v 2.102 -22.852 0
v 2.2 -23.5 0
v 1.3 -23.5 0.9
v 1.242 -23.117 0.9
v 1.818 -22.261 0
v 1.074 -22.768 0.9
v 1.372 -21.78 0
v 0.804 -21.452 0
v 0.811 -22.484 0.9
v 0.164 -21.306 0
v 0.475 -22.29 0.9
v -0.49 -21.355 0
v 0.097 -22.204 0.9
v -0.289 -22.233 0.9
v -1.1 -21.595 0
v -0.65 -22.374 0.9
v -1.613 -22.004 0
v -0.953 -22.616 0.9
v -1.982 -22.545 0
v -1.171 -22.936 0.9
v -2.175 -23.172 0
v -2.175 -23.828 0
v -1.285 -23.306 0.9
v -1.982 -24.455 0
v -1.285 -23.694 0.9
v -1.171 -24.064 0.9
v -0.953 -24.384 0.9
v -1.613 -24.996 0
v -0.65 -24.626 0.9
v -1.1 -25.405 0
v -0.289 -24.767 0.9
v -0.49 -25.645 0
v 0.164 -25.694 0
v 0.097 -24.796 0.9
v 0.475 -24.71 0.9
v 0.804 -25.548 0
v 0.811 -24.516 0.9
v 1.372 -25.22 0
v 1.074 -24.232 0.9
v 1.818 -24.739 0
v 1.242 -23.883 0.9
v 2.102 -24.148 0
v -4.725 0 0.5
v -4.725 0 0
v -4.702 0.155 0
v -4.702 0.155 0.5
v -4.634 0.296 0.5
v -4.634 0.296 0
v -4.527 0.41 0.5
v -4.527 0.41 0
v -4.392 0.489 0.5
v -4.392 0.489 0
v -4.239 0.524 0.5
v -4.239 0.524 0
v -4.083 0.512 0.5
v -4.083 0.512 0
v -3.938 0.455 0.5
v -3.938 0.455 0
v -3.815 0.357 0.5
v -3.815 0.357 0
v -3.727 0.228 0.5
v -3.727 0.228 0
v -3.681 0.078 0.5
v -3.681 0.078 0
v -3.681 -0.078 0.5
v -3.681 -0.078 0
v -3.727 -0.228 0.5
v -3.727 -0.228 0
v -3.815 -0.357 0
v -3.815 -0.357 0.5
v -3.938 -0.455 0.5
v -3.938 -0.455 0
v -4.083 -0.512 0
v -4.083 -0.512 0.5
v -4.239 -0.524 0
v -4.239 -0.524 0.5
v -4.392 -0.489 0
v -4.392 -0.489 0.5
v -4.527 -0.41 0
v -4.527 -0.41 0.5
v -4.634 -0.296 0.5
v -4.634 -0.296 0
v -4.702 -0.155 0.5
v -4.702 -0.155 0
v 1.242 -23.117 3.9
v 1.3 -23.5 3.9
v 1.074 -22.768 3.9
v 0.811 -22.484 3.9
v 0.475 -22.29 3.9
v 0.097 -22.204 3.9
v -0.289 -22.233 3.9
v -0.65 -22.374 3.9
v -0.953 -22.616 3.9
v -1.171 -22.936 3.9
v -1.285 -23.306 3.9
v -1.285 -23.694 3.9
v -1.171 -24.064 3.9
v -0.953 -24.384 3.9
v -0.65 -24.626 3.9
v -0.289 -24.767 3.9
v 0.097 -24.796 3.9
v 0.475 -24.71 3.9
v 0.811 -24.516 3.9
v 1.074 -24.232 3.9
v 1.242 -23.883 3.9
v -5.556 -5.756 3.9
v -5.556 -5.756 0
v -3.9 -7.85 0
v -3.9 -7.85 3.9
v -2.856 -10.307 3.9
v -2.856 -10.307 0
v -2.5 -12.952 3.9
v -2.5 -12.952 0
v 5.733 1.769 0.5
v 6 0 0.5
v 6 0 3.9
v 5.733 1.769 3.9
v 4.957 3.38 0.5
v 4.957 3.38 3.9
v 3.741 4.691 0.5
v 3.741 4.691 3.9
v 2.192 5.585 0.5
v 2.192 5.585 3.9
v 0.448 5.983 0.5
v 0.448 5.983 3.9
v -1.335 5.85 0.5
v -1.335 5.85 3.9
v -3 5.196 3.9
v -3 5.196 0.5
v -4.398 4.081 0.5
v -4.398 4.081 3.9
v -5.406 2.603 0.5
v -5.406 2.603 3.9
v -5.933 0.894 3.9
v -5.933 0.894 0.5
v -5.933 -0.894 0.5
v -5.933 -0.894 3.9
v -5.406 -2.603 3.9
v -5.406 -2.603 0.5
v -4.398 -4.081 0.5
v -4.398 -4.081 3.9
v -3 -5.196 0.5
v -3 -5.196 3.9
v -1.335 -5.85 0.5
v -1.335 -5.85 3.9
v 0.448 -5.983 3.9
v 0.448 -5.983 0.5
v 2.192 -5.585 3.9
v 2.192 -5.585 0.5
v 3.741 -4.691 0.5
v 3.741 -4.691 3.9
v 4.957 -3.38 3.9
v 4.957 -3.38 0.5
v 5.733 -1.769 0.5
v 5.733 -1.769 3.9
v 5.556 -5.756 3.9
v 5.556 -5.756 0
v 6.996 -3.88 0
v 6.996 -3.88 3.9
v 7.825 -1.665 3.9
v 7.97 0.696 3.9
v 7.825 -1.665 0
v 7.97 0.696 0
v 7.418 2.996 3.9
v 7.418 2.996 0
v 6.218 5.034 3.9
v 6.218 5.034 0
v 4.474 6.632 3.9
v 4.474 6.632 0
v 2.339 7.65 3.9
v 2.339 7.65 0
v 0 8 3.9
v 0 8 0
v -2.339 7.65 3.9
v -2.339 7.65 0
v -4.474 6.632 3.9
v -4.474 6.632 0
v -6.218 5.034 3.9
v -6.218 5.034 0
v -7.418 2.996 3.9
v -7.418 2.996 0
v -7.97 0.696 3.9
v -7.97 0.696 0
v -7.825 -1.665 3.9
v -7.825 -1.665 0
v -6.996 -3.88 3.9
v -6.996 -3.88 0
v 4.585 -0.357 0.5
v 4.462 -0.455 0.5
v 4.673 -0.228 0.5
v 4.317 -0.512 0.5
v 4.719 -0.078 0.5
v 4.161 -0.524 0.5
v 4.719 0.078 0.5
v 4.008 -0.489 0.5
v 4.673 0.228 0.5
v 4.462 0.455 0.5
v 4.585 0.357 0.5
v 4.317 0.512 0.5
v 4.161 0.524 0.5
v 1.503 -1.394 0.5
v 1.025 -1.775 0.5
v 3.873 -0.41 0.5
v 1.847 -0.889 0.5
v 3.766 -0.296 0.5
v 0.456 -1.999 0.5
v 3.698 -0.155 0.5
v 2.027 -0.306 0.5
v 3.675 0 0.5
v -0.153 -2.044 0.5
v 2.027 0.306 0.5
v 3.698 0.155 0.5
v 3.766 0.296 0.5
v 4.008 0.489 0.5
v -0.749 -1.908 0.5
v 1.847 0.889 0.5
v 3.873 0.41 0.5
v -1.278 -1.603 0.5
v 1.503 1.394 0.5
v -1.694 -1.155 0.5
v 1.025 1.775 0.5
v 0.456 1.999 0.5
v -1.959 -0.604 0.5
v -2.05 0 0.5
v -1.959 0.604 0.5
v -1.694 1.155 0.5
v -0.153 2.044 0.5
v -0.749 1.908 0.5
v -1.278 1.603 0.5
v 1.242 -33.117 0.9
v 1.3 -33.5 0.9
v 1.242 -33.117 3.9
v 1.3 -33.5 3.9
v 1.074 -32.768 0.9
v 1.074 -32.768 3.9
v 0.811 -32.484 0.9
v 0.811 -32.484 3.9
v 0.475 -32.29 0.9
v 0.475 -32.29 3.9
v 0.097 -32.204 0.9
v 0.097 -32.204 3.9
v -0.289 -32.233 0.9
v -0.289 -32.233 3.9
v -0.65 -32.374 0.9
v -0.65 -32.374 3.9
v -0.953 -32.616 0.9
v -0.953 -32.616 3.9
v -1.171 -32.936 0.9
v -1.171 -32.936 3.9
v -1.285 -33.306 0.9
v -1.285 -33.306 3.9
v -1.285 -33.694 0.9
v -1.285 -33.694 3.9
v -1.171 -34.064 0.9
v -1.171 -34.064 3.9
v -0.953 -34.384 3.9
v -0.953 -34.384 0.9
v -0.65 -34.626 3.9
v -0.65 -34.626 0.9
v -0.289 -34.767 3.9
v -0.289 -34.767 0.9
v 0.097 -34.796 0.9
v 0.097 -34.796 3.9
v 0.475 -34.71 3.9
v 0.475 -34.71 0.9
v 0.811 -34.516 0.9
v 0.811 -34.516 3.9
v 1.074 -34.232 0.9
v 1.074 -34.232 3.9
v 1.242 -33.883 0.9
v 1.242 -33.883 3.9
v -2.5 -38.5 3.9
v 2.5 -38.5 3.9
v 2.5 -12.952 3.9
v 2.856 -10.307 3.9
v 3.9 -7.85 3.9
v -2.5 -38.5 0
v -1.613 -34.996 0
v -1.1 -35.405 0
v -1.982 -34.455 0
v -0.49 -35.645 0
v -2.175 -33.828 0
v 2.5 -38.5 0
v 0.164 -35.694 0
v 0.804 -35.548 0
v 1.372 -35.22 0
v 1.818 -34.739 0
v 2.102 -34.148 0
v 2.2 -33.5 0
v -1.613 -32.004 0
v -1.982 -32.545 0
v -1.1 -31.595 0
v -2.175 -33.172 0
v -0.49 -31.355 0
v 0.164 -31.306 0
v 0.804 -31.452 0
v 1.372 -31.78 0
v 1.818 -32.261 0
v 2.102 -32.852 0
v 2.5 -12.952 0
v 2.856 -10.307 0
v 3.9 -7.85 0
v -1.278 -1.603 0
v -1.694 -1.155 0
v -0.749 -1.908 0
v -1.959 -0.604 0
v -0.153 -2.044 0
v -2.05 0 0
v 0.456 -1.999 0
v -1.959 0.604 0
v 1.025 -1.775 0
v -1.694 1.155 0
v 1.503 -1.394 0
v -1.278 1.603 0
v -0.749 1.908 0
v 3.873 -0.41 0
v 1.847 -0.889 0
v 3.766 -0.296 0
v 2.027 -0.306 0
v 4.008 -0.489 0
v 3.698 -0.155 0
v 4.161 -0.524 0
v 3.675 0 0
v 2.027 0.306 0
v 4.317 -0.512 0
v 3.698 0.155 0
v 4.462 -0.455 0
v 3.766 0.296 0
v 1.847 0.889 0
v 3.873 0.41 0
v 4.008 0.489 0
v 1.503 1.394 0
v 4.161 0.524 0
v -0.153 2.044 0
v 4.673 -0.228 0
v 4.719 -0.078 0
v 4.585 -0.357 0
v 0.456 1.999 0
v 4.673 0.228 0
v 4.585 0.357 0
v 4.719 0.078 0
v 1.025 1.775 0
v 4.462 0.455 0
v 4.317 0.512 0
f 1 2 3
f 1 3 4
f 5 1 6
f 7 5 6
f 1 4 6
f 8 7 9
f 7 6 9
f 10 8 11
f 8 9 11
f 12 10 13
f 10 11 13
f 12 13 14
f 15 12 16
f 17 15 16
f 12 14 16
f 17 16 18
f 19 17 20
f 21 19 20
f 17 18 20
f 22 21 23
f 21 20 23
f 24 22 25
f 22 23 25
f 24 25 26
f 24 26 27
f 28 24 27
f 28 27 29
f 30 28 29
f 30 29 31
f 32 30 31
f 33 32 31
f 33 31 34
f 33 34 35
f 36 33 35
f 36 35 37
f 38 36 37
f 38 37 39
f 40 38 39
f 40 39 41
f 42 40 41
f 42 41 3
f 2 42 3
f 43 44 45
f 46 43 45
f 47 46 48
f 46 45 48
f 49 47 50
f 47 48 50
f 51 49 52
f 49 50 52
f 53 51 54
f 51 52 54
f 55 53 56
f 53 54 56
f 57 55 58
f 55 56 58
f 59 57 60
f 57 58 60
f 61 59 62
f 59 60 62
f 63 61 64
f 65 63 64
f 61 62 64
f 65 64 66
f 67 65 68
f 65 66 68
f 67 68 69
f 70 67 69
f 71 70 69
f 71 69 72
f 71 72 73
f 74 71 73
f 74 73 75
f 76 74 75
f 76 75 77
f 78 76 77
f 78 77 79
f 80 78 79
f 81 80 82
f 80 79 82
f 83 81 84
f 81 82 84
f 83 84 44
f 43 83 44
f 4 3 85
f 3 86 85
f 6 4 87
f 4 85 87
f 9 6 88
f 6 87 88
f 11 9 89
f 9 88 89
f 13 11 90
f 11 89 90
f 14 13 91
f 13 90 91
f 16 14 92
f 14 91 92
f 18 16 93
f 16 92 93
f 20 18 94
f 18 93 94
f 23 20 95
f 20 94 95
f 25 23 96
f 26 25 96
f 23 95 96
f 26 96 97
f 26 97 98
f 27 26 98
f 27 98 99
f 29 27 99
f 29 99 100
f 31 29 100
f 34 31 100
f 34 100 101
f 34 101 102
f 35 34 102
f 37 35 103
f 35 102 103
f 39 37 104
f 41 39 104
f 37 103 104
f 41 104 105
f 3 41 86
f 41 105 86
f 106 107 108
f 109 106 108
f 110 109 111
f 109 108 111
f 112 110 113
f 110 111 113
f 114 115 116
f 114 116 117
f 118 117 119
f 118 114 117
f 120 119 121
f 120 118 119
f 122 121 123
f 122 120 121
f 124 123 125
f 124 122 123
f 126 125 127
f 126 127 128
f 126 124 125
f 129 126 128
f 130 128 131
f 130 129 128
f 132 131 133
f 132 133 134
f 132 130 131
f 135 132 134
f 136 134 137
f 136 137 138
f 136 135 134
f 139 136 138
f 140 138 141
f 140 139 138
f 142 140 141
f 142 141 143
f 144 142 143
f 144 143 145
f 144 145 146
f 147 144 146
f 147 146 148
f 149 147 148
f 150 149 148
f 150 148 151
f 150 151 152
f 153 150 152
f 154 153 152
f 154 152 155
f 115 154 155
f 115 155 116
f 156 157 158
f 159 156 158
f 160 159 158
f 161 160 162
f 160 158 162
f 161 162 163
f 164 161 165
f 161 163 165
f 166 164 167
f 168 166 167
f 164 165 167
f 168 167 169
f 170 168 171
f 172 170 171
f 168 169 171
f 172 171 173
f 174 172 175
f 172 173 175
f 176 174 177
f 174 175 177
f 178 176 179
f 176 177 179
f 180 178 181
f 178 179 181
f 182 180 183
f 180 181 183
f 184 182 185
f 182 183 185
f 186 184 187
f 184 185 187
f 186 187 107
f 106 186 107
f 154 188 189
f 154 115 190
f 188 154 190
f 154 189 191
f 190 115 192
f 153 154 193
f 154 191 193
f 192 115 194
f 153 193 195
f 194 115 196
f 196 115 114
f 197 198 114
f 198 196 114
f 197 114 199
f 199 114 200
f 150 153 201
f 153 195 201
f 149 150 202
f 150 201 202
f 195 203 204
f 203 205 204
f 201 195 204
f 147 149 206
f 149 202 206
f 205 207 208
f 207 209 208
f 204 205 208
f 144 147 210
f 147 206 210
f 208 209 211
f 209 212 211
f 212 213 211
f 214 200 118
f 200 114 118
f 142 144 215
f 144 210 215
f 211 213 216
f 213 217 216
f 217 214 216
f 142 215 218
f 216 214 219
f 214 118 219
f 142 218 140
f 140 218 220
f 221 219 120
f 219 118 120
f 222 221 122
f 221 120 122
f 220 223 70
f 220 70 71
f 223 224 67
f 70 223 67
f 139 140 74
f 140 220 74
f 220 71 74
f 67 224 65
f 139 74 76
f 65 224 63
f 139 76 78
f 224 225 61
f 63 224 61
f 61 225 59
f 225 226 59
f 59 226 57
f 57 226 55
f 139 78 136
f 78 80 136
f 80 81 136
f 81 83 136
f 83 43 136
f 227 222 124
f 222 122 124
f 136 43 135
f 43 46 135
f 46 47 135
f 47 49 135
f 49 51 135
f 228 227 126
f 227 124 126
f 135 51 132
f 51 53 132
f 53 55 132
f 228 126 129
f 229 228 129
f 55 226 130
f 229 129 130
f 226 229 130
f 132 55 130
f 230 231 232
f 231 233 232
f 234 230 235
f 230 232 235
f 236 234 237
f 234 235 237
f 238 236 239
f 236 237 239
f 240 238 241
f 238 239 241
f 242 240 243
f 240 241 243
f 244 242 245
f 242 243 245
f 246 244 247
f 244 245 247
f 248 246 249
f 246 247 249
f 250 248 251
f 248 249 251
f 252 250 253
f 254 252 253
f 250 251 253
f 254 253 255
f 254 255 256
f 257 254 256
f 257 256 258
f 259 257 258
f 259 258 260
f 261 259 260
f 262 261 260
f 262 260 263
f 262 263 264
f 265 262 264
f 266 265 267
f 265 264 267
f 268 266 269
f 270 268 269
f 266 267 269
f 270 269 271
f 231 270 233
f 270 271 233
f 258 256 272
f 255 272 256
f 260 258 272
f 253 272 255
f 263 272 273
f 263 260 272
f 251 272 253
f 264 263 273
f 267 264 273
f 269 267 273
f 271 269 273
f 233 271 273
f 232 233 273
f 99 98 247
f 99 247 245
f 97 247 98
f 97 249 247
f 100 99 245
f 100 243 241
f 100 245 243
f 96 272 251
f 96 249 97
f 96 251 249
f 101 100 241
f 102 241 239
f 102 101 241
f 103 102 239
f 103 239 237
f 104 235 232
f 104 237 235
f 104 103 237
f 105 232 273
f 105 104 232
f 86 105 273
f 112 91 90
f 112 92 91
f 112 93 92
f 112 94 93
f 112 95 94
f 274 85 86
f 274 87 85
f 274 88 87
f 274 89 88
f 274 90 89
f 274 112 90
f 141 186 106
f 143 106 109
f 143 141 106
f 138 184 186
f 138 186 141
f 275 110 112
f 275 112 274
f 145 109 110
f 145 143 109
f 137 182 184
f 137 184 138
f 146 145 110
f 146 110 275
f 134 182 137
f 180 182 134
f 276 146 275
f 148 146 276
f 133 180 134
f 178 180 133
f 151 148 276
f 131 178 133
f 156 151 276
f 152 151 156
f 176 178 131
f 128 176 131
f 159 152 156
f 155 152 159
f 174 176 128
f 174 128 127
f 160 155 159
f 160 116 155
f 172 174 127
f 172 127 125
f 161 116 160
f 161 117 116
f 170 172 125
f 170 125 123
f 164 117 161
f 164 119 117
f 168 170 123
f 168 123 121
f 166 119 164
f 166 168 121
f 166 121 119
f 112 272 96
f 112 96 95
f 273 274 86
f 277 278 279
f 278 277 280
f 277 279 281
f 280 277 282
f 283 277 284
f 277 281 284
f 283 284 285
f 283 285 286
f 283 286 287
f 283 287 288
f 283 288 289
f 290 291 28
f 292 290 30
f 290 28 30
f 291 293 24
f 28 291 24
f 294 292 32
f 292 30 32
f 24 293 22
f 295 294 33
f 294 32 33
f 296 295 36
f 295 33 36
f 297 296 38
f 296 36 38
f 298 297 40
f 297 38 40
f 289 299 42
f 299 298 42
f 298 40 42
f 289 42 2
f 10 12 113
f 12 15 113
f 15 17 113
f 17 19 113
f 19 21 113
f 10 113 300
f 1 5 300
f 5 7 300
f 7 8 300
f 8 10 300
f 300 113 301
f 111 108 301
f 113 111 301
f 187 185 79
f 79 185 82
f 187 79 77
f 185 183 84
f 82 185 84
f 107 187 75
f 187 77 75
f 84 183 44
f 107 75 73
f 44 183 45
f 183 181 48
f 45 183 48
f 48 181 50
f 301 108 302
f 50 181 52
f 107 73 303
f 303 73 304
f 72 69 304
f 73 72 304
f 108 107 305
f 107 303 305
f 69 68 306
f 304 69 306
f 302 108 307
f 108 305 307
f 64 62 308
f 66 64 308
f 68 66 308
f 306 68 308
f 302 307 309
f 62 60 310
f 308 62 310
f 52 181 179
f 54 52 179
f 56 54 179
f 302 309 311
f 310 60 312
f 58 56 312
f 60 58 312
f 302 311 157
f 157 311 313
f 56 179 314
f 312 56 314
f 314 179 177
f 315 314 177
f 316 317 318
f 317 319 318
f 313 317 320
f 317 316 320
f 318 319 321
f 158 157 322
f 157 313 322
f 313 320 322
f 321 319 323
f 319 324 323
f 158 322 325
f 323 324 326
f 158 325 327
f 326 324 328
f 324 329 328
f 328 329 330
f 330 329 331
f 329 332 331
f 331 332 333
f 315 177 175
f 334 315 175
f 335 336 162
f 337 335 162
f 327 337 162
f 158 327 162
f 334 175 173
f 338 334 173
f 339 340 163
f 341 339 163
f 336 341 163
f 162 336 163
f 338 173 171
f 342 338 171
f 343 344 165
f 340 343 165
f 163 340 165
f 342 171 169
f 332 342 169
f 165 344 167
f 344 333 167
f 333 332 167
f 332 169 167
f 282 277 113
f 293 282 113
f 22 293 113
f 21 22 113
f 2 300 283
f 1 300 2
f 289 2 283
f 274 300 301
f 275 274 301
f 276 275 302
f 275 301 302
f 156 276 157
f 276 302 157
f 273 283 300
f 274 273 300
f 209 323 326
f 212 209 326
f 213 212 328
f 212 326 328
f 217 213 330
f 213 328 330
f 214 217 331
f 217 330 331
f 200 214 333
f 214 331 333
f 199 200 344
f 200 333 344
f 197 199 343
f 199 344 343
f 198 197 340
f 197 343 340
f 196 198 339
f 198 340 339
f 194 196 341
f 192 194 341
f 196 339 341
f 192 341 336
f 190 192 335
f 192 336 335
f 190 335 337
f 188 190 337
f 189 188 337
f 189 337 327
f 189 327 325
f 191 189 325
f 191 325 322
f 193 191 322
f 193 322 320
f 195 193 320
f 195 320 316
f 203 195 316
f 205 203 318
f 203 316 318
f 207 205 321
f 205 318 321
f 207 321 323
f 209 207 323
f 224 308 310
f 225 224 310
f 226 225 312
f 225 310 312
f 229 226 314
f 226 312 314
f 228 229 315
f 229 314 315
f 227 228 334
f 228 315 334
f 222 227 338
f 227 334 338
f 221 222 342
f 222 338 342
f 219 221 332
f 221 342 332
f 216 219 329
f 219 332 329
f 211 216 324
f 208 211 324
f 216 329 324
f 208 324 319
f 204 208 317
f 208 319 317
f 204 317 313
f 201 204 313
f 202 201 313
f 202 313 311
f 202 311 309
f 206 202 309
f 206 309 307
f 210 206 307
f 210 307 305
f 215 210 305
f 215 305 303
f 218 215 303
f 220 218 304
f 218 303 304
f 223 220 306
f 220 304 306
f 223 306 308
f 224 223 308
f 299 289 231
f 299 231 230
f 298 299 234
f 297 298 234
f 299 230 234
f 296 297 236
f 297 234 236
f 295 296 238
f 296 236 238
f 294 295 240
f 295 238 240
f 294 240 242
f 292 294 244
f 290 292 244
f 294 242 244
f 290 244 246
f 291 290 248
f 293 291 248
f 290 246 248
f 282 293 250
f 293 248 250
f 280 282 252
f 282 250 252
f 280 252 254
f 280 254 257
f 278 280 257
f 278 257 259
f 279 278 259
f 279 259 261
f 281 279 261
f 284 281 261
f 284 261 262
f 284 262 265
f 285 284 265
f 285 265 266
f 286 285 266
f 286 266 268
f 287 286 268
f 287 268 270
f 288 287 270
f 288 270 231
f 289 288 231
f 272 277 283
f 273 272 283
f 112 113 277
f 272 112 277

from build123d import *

# Parameters (mm, degrees)
SKETCH1_R                                       = 6
BOSS_EXTRUDE1_DEPTH                             = 3.9
SKETCH5_R                                       = 8
SKETCH5_R_2                                     = 2.05
SKETCH5_R_3                                     = 0.525
BOSS_EXTRUDE3_DEPTH                             = 0.5
CSK_FOR_M2_FLAT_HEAD_MACHINE_SCREW1_D           = 2.6
CSK_FOR_M2_FLAT_HEAD_MACHINE_SCREW1_CSINK_D     = 4.4
CSK_FOR_M2_FLAT_HEAD_MACHINE_SCREW1_CSINK_ANGLE = 90


with BuildPart() as part:
    # Sketch1 → Boss-Extrude1 (new body)
    with BuildSketch(Plane.XY):
        with BuildLine():
            Line((-2.5, -12.951833847), (-2.5, -38.5))
            Line((-2.5, -38.5), (2.5, -38.5))
            Line((2.5, -38.5), (2.5, -12.951833847))
            ThreePointArc((2.5, -12.951833847), (3.295532486, -9.043154047), (5.555555556, -5.756370599))
            ThreePointArc((5.555555556, -5.756370599), (0, 8), (-5.555555556, -5.756370599))
            ThreePointArc((-5.555555556, -5.756370599), (-3.295532486, -9.043154047), (-2.5, -12.951833847))
        make_face()
        Circle(SKETCH1_R, mode=Mode.SUBTRACT)
    extrude(amount=BOSS_EXTRUDE1_DEPTH)

    # Sketch5 → Boss-Extrude3 (add)
    with BuildSketch(Plane(origin=(0, 0, 0), x_dir=(-1, 0, 0), z_dir=(0, 0, -1))):
        Circle(SKETCH5_R)
        Circle(SKETCH5_R_2, mode=Mode.SUBTRACT)
        with Locations((4.2, 0)):
            Circle(SKETCH5_R_3, mode=Mode.SUBTRACT)
        with Locations((-4.2, 0)):
            Circle(SKETCH5_R_3, mode=Mode.SUBTRACT)
    extrude(amount=-BOSS_EXTRUDE3_DEPTH)

    # CSK for M2 Flat Head Machine Screw1 (through all)
    with Locations(Plane(origin=(0, 0, 0), x_dir=(-1, 0, 0), z_dir=(0, 0, -1))):
        with Locations((0, -33.5), (0, -23.5)):
            CounterSinkHole(CSK_FOR_M2_FLAT_HEAD_MACHINE_SCREW1_D / 2, CSK_FOR_M2_FLAT_HEAD_MACHINE_SCREW1_CSINK_D / 2, counter_sink_angle=CSK_FOR_M2_FLAT_HEAD_MACHINE_SCREW1_CSINK_ANGLE)


solid = part.part
